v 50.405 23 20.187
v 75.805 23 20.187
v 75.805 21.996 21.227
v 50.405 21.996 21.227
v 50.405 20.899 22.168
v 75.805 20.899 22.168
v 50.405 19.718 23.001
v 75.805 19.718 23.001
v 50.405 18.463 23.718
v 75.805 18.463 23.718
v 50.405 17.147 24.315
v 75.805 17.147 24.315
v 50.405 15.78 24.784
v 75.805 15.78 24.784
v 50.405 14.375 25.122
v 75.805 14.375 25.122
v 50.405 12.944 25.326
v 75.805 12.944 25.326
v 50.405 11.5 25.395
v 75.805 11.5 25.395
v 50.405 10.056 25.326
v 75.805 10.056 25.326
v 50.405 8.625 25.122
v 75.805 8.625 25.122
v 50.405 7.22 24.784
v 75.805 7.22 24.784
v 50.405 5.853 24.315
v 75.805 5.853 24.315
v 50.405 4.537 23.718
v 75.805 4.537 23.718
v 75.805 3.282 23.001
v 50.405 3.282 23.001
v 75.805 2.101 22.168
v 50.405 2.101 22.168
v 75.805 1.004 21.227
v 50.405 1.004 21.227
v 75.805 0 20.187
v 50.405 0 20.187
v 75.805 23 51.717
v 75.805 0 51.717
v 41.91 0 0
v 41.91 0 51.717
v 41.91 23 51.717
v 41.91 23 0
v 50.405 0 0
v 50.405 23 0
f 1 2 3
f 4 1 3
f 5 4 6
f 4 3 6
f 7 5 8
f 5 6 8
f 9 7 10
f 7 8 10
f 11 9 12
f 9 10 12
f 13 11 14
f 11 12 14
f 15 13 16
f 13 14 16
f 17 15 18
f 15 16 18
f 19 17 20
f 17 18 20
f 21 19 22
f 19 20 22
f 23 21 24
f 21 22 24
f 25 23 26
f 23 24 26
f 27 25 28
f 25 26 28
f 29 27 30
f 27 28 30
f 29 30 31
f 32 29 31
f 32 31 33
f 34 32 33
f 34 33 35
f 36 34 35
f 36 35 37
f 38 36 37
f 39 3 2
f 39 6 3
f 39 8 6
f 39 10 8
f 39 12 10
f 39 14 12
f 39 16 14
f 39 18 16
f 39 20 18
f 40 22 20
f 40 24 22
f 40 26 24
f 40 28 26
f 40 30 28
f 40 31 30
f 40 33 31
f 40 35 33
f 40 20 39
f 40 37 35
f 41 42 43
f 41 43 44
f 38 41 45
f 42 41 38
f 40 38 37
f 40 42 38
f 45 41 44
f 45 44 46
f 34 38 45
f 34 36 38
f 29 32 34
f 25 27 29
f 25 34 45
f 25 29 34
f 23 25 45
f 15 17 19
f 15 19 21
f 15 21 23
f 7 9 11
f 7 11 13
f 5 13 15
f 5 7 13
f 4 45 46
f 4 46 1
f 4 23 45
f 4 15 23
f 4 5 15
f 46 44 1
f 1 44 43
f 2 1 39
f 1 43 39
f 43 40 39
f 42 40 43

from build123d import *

# Parameters (mm, degrees)
F1_DEPTH   = 23
F1_FACE1_W = 23
F1_FACE1_H = 51.7166927457
F3_DEPTH   = 25.4


with BuildPart() as f1:
    # F0 (on Front) → F1 (new body)
    with BuildSketch(Plane.XZ):
        Polygon((41.91, 51.7166927457), (41.91, 51.36642), (41.91, 0), (75.8052021265, 0), (75.8052021265, 51.7166927457), align=None)
    extrude(amount=-F1_DEPTH)

    # F2 (on face) + F1_face1 (on face) → F3 (cut)
    with BuildSketch(Plane.YZ.offset(75.8052021265)):
        with BuildLine():
            Line((0, 0), (23, 0))
            ThreePointArc((23, 0), (11.5, 25.3947172526), (0, 0))
        make_face()
    with BuildSketch(Plane(origin=(41.91, 11.5, 25.8583463728), x_dir=(0, -1, 0), z_dir=(-1, 0, 0))):
        Rectangle(F1_FACE1_W, F1_FACE1_H)
    extrude(amount=-F3_DEPTH, dir=(1, 0, 0), mode=Mode.SUBTRACT)


solid = f1.part
